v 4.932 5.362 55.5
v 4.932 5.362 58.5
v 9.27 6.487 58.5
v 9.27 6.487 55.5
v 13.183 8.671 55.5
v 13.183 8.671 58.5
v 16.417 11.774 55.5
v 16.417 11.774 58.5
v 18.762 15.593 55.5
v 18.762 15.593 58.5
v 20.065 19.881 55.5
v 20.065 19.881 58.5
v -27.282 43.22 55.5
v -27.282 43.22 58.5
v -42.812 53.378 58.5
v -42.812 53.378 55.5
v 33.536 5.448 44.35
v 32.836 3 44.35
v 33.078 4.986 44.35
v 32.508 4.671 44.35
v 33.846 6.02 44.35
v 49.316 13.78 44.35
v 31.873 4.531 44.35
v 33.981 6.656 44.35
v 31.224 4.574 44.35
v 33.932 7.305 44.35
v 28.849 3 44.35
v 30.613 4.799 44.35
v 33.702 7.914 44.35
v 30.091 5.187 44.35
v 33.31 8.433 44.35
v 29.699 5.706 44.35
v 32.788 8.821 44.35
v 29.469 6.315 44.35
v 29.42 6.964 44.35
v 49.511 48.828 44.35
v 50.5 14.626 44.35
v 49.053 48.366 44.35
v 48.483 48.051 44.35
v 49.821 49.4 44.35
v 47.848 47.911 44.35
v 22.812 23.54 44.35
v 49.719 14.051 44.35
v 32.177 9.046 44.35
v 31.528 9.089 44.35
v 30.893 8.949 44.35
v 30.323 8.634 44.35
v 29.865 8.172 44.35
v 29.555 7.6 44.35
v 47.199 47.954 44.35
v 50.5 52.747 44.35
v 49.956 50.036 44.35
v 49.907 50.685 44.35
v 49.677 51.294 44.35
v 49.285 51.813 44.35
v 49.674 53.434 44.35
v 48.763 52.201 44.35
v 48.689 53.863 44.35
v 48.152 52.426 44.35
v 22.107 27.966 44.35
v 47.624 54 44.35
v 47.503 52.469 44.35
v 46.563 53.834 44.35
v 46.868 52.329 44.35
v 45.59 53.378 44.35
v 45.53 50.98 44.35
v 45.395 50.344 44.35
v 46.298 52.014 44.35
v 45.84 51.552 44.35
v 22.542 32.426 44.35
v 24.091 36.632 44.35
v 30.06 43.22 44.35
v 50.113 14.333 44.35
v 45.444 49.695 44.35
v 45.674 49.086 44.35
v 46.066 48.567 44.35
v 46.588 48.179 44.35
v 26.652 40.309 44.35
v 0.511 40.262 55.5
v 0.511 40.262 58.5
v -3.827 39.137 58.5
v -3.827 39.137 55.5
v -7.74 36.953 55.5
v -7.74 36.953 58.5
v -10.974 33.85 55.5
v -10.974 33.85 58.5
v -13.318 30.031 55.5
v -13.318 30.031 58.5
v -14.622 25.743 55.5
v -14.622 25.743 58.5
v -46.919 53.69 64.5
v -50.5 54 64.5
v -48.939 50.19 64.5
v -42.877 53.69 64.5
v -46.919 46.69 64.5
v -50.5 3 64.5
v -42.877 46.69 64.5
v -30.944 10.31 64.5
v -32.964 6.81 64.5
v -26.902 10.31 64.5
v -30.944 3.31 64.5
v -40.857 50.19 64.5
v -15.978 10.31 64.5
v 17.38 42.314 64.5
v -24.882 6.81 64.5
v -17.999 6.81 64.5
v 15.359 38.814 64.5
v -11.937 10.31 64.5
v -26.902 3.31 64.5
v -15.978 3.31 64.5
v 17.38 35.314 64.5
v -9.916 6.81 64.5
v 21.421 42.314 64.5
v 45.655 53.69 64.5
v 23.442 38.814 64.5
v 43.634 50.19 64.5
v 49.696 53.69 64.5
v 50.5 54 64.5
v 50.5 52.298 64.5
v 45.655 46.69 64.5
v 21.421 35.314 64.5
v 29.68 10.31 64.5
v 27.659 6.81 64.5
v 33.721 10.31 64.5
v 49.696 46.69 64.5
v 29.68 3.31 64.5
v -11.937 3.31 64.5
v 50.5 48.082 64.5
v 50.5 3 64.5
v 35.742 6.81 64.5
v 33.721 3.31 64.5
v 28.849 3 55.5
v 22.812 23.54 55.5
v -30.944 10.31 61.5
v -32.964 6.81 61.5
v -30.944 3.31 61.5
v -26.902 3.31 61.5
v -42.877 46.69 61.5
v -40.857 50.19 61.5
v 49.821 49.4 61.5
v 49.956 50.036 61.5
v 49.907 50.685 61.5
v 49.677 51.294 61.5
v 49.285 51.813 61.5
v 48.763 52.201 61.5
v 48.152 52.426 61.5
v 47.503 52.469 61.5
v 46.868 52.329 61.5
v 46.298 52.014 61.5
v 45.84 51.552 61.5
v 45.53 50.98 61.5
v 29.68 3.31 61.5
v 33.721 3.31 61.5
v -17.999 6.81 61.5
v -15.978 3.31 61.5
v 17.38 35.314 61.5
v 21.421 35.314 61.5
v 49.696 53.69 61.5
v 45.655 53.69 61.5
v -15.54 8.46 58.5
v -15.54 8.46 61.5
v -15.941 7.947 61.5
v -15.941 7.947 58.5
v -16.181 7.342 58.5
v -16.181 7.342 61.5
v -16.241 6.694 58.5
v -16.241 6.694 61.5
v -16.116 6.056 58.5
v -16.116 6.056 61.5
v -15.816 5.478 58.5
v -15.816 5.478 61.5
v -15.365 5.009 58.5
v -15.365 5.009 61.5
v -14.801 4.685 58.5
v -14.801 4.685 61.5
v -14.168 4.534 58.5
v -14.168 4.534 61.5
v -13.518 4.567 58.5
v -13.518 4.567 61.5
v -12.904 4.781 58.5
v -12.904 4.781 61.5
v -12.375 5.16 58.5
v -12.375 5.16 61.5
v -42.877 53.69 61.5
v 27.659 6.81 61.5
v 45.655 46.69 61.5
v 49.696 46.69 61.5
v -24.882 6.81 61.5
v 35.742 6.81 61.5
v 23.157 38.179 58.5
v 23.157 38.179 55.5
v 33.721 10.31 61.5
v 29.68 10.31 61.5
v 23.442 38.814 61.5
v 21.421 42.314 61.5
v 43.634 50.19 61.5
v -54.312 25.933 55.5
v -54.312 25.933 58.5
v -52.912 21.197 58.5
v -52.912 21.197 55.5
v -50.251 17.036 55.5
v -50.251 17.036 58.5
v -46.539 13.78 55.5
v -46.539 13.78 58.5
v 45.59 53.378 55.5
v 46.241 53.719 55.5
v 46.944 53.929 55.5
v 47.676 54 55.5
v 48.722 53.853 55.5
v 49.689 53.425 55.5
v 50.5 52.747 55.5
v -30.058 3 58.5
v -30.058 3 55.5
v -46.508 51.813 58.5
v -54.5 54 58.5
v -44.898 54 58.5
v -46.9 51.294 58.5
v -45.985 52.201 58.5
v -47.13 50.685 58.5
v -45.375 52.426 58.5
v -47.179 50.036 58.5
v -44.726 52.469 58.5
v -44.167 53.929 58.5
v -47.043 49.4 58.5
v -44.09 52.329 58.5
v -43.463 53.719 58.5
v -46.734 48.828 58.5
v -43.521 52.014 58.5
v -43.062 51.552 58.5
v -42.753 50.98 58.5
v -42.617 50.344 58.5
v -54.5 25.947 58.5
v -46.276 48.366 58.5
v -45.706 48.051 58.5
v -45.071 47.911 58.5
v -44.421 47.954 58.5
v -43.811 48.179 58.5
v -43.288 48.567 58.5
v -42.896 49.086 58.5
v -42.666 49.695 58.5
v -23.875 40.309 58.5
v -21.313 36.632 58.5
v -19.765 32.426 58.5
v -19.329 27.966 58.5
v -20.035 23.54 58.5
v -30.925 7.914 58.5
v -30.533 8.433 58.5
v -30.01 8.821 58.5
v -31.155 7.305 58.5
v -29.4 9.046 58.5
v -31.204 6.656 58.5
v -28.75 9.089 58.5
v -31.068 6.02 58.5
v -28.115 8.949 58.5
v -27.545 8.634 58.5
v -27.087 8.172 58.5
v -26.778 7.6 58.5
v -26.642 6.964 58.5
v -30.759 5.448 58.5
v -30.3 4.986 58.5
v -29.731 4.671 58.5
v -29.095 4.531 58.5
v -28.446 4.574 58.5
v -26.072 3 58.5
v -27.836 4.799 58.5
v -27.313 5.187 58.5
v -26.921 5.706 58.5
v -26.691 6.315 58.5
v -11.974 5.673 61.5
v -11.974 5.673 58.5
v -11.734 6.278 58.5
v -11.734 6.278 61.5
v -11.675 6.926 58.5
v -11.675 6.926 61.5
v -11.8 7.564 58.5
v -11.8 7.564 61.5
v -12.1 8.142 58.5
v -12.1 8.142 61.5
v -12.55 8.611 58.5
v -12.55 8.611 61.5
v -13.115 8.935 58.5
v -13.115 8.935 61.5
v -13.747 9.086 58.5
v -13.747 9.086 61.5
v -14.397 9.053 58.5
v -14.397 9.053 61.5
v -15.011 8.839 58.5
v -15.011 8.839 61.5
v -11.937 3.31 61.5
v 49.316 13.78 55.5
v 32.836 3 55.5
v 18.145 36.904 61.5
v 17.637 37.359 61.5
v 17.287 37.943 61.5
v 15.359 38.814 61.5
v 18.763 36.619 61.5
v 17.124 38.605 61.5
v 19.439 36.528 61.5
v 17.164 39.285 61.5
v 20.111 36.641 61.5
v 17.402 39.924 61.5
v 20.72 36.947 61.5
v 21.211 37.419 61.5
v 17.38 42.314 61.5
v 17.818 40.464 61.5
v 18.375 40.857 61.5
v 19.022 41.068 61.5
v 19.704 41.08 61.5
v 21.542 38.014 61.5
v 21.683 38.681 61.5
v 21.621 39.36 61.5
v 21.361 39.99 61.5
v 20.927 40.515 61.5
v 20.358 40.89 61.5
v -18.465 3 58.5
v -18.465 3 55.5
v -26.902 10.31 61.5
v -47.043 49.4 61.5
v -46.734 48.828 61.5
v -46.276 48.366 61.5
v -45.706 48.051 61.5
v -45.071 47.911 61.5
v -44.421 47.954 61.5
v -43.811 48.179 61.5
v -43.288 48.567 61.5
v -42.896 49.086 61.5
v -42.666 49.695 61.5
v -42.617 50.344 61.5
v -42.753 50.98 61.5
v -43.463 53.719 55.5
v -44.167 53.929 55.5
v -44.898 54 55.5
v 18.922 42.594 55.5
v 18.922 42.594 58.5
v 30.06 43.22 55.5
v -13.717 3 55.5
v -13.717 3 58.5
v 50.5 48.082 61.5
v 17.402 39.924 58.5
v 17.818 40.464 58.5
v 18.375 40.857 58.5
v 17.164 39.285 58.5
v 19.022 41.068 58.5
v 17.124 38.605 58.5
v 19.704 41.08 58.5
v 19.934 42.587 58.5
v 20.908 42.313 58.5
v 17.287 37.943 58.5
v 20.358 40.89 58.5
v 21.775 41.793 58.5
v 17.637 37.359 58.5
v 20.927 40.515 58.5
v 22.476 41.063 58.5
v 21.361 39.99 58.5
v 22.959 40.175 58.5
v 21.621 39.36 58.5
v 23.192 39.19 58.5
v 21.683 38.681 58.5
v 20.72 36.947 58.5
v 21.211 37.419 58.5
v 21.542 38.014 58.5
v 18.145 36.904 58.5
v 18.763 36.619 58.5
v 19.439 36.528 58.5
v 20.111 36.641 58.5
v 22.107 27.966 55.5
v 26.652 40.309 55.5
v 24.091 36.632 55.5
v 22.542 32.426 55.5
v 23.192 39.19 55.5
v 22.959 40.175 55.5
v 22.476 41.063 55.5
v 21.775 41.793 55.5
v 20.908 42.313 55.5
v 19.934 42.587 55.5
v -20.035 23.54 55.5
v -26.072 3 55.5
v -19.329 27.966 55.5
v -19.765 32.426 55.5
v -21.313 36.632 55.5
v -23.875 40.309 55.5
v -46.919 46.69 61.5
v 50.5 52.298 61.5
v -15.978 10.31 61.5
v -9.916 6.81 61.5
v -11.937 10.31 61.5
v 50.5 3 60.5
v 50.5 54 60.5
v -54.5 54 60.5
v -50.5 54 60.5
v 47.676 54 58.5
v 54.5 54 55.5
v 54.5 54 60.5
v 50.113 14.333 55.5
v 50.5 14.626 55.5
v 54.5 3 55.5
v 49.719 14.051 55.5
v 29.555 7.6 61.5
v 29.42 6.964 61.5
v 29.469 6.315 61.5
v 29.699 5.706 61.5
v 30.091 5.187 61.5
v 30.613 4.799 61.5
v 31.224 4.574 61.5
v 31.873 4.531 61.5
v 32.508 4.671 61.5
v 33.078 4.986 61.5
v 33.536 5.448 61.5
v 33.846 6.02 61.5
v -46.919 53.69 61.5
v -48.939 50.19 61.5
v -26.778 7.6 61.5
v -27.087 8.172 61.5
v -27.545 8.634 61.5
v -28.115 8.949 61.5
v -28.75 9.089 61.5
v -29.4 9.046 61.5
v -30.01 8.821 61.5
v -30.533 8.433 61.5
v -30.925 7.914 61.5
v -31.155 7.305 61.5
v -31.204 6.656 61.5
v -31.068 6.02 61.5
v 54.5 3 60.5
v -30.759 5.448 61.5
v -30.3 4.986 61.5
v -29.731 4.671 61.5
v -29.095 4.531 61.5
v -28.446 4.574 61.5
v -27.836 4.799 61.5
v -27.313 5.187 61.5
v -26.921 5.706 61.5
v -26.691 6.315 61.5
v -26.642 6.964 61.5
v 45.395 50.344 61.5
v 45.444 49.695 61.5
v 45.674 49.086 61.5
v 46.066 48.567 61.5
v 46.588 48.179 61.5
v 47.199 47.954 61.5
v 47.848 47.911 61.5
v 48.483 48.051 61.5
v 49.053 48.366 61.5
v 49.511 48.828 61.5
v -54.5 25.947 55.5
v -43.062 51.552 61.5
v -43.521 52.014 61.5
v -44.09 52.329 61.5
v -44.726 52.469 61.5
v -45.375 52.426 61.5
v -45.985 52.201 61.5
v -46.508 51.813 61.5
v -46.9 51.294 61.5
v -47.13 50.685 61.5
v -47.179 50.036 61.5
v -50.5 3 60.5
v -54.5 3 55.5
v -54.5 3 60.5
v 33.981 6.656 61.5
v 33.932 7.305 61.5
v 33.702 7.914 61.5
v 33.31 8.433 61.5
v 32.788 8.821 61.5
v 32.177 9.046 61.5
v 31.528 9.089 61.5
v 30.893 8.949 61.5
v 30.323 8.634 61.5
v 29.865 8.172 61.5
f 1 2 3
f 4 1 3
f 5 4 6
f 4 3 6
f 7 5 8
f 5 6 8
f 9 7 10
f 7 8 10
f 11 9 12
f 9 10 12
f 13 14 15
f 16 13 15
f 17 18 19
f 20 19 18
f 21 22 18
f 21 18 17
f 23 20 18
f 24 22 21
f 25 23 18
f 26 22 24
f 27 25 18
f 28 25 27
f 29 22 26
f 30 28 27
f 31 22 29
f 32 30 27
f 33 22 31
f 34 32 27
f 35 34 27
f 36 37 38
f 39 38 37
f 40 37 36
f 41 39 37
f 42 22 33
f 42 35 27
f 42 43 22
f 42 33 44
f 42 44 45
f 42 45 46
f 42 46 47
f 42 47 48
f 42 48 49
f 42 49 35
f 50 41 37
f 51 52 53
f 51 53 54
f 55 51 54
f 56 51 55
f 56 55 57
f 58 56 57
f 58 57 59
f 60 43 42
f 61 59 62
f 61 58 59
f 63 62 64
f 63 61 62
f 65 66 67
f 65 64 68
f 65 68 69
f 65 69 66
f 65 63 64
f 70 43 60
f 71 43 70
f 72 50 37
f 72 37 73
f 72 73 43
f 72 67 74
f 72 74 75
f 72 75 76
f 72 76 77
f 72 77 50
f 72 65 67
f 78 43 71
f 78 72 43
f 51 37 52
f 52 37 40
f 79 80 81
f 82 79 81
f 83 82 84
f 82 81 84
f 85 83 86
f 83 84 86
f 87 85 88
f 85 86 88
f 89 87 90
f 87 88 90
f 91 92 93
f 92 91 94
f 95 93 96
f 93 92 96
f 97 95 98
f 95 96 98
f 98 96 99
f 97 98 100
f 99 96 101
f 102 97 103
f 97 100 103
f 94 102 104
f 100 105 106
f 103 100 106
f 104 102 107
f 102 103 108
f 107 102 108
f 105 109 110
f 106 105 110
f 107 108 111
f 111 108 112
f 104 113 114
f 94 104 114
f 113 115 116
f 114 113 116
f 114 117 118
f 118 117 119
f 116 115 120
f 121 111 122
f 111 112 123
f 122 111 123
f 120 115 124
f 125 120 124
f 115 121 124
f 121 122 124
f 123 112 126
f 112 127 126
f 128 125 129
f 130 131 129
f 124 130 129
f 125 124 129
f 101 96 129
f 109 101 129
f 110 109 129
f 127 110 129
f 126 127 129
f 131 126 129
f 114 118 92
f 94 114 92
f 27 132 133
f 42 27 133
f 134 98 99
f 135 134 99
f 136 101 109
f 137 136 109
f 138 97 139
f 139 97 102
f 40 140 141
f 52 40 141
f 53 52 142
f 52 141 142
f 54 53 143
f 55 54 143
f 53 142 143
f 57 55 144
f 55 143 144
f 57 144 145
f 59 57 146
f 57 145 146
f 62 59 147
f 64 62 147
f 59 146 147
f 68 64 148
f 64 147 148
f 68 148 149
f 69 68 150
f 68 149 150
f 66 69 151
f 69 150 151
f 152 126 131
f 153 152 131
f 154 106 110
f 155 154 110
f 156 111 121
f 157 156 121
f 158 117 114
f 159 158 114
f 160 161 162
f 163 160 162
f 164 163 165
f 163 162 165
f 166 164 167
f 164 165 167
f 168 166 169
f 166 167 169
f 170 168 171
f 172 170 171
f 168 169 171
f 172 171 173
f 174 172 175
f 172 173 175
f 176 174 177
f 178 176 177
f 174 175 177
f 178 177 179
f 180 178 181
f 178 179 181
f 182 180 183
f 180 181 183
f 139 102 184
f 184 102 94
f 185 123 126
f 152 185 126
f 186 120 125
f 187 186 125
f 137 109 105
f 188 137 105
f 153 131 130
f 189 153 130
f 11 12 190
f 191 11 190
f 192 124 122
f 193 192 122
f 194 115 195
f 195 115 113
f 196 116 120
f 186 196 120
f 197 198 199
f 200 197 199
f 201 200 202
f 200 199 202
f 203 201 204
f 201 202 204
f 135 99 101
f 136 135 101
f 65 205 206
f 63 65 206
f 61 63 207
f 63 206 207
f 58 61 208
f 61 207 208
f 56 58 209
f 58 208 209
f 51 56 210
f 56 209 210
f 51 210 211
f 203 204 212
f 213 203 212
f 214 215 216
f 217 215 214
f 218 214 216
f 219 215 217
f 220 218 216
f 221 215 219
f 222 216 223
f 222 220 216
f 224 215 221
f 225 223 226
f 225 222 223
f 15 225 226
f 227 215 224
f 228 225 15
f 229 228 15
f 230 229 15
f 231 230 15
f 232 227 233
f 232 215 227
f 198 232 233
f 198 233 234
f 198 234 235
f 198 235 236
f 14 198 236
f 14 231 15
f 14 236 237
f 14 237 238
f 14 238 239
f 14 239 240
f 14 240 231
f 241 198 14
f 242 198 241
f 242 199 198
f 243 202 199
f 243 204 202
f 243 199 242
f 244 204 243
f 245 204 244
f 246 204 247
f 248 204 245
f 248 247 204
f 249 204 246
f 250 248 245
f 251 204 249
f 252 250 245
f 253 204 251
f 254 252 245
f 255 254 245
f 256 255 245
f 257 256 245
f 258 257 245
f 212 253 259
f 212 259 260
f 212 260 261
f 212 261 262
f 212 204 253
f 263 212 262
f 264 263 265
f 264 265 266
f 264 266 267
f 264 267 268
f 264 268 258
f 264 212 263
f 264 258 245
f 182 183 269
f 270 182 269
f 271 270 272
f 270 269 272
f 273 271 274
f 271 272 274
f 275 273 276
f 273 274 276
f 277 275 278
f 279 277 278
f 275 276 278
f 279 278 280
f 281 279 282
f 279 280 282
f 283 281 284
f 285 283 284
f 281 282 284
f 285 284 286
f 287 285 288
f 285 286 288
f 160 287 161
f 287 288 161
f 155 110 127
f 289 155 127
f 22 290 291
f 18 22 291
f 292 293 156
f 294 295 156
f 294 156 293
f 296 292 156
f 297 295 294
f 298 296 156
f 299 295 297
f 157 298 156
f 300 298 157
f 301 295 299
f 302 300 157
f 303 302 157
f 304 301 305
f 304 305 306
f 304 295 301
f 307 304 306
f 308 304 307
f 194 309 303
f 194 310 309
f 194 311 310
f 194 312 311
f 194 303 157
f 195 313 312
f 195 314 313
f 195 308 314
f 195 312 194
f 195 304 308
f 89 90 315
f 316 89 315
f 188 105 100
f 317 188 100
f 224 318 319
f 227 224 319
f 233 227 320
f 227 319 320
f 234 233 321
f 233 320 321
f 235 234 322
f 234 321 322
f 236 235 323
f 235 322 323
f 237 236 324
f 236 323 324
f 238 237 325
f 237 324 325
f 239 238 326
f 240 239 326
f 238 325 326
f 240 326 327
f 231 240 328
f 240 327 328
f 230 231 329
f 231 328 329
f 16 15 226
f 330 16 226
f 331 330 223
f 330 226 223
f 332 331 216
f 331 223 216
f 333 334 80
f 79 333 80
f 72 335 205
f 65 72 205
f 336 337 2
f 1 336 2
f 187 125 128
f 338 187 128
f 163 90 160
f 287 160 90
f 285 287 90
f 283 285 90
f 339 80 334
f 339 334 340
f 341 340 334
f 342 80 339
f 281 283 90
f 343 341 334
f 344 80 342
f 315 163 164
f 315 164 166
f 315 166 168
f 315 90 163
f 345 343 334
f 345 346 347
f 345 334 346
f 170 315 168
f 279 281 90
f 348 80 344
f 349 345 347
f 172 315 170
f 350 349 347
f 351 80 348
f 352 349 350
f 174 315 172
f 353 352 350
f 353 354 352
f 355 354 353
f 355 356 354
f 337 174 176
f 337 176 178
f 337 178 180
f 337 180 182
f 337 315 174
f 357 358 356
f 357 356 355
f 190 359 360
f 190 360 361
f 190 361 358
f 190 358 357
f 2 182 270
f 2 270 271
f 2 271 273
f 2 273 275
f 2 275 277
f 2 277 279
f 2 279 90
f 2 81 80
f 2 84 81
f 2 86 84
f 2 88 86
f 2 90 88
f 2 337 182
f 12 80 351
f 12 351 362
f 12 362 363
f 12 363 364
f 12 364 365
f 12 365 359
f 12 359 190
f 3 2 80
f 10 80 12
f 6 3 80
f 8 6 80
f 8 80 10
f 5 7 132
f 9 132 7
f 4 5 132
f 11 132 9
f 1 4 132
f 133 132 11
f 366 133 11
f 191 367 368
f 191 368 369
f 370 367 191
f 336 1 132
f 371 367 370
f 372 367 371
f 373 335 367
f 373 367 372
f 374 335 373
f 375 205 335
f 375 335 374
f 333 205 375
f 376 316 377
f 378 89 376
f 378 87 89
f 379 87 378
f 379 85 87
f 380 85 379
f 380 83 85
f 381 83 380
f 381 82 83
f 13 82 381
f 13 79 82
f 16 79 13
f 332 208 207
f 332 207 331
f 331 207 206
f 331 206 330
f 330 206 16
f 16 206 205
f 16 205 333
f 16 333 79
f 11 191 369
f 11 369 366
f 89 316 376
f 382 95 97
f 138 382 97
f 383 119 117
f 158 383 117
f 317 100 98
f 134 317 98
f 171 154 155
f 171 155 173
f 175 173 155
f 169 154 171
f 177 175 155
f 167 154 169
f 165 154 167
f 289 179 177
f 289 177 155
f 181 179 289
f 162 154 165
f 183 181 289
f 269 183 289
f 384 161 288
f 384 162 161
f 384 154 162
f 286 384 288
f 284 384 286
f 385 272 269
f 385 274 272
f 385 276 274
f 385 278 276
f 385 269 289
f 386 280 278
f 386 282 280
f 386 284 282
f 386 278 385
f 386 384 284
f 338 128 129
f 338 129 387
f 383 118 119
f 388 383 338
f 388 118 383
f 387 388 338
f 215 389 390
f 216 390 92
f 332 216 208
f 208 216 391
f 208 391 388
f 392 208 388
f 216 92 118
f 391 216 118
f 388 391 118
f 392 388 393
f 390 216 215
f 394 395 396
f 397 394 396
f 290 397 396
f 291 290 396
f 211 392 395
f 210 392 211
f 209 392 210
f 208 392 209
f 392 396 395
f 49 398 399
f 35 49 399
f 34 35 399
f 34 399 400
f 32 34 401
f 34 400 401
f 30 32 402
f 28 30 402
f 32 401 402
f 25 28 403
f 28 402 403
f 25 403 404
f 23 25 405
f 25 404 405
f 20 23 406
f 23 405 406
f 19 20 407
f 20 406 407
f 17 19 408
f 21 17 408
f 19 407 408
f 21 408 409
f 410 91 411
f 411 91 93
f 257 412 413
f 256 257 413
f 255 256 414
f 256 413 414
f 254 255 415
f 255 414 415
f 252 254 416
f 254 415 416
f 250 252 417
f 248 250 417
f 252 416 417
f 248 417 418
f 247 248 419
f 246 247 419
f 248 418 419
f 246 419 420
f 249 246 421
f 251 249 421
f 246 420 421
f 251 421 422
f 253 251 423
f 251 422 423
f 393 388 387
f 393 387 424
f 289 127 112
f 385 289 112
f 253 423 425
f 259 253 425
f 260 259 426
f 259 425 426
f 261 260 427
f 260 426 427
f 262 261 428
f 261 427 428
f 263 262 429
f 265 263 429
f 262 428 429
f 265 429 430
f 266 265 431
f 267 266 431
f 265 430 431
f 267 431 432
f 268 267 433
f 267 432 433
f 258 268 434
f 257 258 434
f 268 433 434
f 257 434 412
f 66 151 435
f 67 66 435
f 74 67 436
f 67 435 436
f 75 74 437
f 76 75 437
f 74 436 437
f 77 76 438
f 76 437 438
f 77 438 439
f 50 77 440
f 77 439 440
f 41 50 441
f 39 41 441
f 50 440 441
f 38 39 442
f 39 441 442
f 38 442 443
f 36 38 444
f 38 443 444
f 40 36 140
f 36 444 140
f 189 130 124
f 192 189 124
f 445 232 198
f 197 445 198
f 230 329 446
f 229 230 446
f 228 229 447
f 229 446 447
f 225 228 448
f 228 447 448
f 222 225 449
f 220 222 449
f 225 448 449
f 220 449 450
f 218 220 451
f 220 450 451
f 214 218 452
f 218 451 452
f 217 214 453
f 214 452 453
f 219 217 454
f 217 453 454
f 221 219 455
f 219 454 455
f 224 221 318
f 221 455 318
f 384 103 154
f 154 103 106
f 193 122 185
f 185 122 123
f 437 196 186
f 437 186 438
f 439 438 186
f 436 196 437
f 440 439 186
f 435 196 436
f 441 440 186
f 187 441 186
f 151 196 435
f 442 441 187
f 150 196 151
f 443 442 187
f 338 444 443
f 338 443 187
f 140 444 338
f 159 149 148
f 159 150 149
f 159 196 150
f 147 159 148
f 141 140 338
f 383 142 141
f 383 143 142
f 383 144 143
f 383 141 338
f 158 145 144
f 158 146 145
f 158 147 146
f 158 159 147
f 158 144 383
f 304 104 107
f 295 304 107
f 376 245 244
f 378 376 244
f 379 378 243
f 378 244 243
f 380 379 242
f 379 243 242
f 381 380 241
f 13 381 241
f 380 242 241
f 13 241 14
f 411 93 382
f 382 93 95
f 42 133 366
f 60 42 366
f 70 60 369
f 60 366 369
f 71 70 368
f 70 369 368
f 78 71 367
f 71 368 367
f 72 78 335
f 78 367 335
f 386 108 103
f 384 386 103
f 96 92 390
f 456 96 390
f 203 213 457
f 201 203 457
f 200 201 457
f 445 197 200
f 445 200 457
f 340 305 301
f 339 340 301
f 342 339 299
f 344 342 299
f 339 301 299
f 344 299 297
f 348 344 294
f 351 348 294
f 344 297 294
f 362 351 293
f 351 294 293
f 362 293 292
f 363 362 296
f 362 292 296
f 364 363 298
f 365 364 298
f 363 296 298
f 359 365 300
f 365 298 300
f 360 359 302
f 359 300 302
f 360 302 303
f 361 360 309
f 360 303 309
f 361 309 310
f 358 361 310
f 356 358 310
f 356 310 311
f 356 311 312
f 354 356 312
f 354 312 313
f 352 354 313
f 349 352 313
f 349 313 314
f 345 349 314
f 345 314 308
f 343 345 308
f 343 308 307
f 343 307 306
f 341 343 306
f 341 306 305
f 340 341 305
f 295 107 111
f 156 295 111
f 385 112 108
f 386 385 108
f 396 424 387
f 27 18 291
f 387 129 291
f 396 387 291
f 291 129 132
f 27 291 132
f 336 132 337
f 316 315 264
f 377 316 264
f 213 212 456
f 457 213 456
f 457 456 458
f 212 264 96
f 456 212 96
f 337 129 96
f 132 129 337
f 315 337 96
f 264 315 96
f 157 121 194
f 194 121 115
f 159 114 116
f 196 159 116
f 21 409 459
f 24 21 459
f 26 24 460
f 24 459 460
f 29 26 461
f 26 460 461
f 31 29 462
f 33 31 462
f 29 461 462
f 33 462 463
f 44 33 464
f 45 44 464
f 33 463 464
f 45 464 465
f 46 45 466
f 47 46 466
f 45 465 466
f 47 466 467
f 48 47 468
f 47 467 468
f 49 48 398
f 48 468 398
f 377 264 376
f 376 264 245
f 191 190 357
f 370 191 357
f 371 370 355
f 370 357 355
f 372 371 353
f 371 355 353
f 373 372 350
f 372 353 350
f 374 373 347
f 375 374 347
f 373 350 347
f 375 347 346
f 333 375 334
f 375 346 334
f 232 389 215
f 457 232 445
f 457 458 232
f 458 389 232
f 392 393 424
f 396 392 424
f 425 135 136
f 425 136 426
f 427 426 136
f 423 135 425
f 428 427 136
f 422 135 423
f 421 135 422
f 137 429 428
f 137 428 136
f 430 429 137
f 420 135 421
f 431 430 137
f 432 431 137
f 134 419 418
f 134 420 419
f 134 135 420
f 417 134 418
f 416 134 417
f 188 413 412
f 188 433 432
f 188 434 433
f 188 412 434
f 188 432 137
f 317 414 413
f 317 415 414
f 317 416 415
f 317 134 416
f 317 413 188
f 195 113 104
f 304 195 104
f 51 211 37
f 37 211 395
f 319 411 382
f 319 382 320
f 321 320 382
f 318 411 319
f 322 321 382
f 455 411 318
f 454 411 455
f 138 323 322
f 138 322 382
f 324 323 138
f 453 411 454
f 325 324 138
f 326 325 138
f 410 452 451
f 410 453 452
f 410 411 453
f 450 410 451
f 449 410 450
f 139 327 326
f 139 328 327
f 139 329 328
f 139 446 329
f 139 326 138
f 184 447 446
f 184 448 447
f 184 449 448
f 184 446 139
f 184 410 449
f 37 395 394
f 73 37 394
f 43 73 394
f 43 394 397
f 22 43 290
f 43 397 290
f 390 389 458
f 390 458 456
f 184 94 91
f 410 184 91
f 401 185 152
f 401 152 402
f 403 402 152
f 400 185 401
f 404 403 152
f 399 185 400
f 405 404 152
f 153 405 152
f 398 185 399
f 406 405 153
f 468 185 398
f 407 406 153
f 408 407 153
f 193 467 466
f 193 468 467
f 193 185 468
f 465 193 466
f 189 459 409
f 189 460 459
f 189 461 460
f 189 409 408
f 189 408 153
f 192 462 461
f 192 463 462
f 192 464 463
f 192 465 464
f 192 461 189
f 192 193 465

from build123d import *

# Parameters (mm, degrees)
SKETCH2_W            = 109
SKETCH2_H            = 6
BOSS_EXTRUDE2_DEPTH  = 54
BOSS_EXTRUDE18_DEPTH = 3
BOSS_EXTRUDE14_DEPTH = 14.15
CUT_EXTRUDE7_DEPTH   = 23
CUT_EXTRUDE8_DEPTH   = 3
SKETCH33_W           = 6
SKETCH33_H           = 3
CUT_EXTRUDE9_DEPTH   = 123
SKETCH34_W           = 4
SKETCH34_H           = 4
CUT_EXTRUDE10_DEPTH  = 86


with BuildPart() as part:
    # Sketch2 → Boss-Extrude2 (new body)
    with BuildSketch(Plane(origin=(0, 0, 0), x_dir=(1, 0, 0), z_dir=(0, 1, 0))):
        with Locations((0, -61.5)):
            Rectangle(SKETCH2_W, SKETCH2_H)
    extrude(amount=BOSS_EXTRUDE2_DEPTH)

    # Sketch30 → Boss-Extrude18 (add)
    with BuildSketch(Plane(origin=(0, 0, 58.5), x_dir=(-1, 0, 0), z_dir=(0, 0, -1))):
        with BuildLine():
            Line((44.898046307, 54), (-54.5, 54))
            Line((-54.5, 54), (-54.5, 3))
            Line((-54.5, 3), (13.717264207, 3))
            Line((13.717264207, 3), (-4.931615029, 5.361896936))
            ThreePointArc((-4.931615029, 5.361896936), (-14.898890302, 10.119374153), (-20.065130462, 19.881040427))
            Line((-20.065130462, 19.881040427), (-23.157396088, 38.179135111))
            ThreePointArc((-23.157396088, 38.179135111), (-22.149967828, 41.451692308), (-18.921946876, 42.593805718))
            Line((-18.921946876, 42.593805718), (-0.511473267, 40.262103064))
            ThreePointArc((-0.511473267, 40.262103064), (9.455802006, 35.504625847), (14.622042166, 25.742959573))
            Line((14.622042166, 25.742959573), (18.46546266, 3))
            Line((18.46546266, 3), (26.071580329, 3))
            Line((26.071580329, 3), (20.034760857, 23.540167479))
            ThreePointArc((20.034760857, 23.540167479), (20.404648352, 34.578434964), (27.282125622, 43.220221367))
            Line((27.282125622, 43.220221367), (42.812477849, 53.378495603))
            ThreePointArc((42.812477849, 53.378495603), (43.809944346, 53.841319504), (44.898046307, 54))
        make_face()
        with BuildLine():
            Line((54.5, 3), (54.5, 25.946731257))
            Line((54.5, 25.946731257), (54.311662737, 25.932891577))
            ThreePointArc((54.311662737, 25.932891577), (51.728512948, 19.022816741), (46.538874378, 13.779778633))
            Line((46.538874378, 13.779778633), (30.058342822, 3))
            Line((30.058342822, 3), (54.5, 3))
        make_face()
    extrude(amount=BOSS_EXTRUDE18_DEPTH)

    # Sketch26 → Boss-Extrude14 (add)
    with BuildSketch(Plane(origin=(0, 0, 58.5), x_dir=(-1, 0, 0), z_dir=(0, 0, -1))):
        with BuildLine():
            Line((-32.835842822, 3), (-28.849080329, 3))
            Line((-28.849080329, 3), (-22.812260857, 23.540167479))
            ThreePointArc((-22.812260857, 23.540167479), (-23.182148352, 34.578434964), (-30.059625622, 43.220221367))
            Line((-30.059625622, 43.220221367), (-45.589977849, 53.378495603))
            ThreePointArc((-45.589977849, 53.378495603), (-48.161514659, 53.968880093), (-50.5, 52.747061074))
            Line((-50.5, 52.747061074), (-50.5, 14.625881424))
            ThreePointArc((-50.5, 14.625881424), (-49.916939273, 14.190586609), (-49.316374378, 13.779778633))
            Line((-49.316374378, 13.779778633), (-32.835842822, 3))
        make_face()
    extrude(amount=BOSS_EXTRUDE14_DEPTH)

    # Sketch9 → Cut-Extrude7 (cut)
    with BuildSketch(Plane.XY.offset(64.5)):
        with BuildLine():
            ThreePointArc((-42.752881471, 50.979977107), (-45.688023414, 52.335164835), (-47.043211142, 49.400022893))
            ThreePointArc((-47.043211142, 49.400022893), (-44.108069199, 48.044835165), (-42.752881471, 50.979977107))
        make_face()
        with BuildLine():
            ThreePointArc((-31.068118529, 6.020022893), (-28.132976586, 4.664835165), (-26.777788858, 7.599977107))
            ThreePointArc((-26.777788858, 7.599977107), (-29.712930801, 8.955164835), (-31.068118529, 6.020022893))
        make_face()
        with BuildLine():
            ThreePointArc((-15.540189678, 8.459583143), (-15.607157436, 5.227384615), (-12.374958909, 5.160416857))
            ThreePointArc((-12.374958909, 5.160416857), (-12.307991151, 8.392615385), (-15.540189678, 8.459583143))
        make_face()
        with BuildLine():
            ThreePointArc((20.983277975, 37.164416857), (21.050245733, 40.396615385), (17.818047205, 40.463583143))
            ThreePointArc((17.818047205, 40.463583143), (17.751079447, 37.231384615), (20.983277975, 37.164416857))
        make_face()
        with BuildLine():
            ThreePointArc((29.555288858, 7.599977107), (30.910476586, 4.664835165), (33.845618529, 6.020022893))
            ThreePointArc((33.845618529, 6.020022893), (32.490430801, 8.955164835), (29.555288858, 7.599977107))
        make_face()
        with BuildLine():
            ThreePointArc((49.820711142, 49.400022893), (48.465523414, 52.335164835), (45.530381471, 50.979977107))
            ThreePointArc((45.530381471, 50.979977107), (46.885569199, 48.044835165), (49.820711142, 49.400022893))
        make_face()
    extrude(amount=-CUT_EXTRUDE7_DEPTH, mode=Mode.SUBTRACT)

    # Sketch24 → Cut-Extrude8 (cut)
    with BuildSketch(Plane.XY.offset(64.5)):
        Polygon((-40.856594422, 50.19), (-42.877320364, 53.69), (-46.918772249, 53.69), (-48.939498191, 50.19), (-46.918772249, 46.69), (-42.877320364, 46.69), align=None)
        Polygon((51.716998191, 50.19), (49.696272249, 53.69), (45.654820364, 53.69), (43.634094422, 50.19), (45.654820364, 46.69), (49.696272249, 46.69), align=None)
        Polygon((35.741905578, 6.81), (33.721179636, 10.31), (29.679727751, 10.31), (27.659001809, 6.81), (29.679727751, 3.31), (33.721179636, 3.31), align=None)
        Polygon((-9.916122409, 6.81), (-11.936848352, 10.31), (-15.978300236, 10.31), (-17.999026178, 6.81), (-15.978300236, 3.31), (-11.936848352, 3.31), align=None)
        Polygon((23.442114474, 38.814), (21.421388532, 42.314), (17.379936648, 42.314), (15.359210706, 38.814), (17.379936648, 35.314), (21.421388532, 35.314), align=None)
        Polygon((-24.881501809, 6.81), (-26.902227751, 10.31), (-30.943679636, 10.31), (-32.964405578, 6.81), (-30.943679636, 3.31), (-26.902227751, 3.31), align=None)
    extrude(amount=-CUT_EXTRUDE8_DEPTH, mode=Mode.SUBTRACT)

    # Sketch33 → Cut-Extrude9 (cut)
    with BuildSketch(Plane.ZY.offset(54.5)):
        with Locations((61.5, 1.5)):
            Rectangle(SKETCH33_W, SKETCH33_H)
    extrude(amount=-CUT_EXTRUDE9_DEPTH, mode=Mode.SUBTRACT)

    # Sketch34 → Cut-Extrude10 (cut)
    with BuildSketch(Plane(origin=(0, 54, 0), x_dir=(1, 0, 0), z_dir=(0, 1, 0))):
        with Locations((-52.5, -62.5)):
            Rectangle(SKETCH34_W, SKETCH34_H)
        with Locations((52.5, -62.5)):
            Rectangle(SKETCH34_W, SKETCH34_H)
    extrude(amount=-CUT_EXTRUDE10_DEPTH, mode=Mode.SUBTRACT)


solid = part.part
